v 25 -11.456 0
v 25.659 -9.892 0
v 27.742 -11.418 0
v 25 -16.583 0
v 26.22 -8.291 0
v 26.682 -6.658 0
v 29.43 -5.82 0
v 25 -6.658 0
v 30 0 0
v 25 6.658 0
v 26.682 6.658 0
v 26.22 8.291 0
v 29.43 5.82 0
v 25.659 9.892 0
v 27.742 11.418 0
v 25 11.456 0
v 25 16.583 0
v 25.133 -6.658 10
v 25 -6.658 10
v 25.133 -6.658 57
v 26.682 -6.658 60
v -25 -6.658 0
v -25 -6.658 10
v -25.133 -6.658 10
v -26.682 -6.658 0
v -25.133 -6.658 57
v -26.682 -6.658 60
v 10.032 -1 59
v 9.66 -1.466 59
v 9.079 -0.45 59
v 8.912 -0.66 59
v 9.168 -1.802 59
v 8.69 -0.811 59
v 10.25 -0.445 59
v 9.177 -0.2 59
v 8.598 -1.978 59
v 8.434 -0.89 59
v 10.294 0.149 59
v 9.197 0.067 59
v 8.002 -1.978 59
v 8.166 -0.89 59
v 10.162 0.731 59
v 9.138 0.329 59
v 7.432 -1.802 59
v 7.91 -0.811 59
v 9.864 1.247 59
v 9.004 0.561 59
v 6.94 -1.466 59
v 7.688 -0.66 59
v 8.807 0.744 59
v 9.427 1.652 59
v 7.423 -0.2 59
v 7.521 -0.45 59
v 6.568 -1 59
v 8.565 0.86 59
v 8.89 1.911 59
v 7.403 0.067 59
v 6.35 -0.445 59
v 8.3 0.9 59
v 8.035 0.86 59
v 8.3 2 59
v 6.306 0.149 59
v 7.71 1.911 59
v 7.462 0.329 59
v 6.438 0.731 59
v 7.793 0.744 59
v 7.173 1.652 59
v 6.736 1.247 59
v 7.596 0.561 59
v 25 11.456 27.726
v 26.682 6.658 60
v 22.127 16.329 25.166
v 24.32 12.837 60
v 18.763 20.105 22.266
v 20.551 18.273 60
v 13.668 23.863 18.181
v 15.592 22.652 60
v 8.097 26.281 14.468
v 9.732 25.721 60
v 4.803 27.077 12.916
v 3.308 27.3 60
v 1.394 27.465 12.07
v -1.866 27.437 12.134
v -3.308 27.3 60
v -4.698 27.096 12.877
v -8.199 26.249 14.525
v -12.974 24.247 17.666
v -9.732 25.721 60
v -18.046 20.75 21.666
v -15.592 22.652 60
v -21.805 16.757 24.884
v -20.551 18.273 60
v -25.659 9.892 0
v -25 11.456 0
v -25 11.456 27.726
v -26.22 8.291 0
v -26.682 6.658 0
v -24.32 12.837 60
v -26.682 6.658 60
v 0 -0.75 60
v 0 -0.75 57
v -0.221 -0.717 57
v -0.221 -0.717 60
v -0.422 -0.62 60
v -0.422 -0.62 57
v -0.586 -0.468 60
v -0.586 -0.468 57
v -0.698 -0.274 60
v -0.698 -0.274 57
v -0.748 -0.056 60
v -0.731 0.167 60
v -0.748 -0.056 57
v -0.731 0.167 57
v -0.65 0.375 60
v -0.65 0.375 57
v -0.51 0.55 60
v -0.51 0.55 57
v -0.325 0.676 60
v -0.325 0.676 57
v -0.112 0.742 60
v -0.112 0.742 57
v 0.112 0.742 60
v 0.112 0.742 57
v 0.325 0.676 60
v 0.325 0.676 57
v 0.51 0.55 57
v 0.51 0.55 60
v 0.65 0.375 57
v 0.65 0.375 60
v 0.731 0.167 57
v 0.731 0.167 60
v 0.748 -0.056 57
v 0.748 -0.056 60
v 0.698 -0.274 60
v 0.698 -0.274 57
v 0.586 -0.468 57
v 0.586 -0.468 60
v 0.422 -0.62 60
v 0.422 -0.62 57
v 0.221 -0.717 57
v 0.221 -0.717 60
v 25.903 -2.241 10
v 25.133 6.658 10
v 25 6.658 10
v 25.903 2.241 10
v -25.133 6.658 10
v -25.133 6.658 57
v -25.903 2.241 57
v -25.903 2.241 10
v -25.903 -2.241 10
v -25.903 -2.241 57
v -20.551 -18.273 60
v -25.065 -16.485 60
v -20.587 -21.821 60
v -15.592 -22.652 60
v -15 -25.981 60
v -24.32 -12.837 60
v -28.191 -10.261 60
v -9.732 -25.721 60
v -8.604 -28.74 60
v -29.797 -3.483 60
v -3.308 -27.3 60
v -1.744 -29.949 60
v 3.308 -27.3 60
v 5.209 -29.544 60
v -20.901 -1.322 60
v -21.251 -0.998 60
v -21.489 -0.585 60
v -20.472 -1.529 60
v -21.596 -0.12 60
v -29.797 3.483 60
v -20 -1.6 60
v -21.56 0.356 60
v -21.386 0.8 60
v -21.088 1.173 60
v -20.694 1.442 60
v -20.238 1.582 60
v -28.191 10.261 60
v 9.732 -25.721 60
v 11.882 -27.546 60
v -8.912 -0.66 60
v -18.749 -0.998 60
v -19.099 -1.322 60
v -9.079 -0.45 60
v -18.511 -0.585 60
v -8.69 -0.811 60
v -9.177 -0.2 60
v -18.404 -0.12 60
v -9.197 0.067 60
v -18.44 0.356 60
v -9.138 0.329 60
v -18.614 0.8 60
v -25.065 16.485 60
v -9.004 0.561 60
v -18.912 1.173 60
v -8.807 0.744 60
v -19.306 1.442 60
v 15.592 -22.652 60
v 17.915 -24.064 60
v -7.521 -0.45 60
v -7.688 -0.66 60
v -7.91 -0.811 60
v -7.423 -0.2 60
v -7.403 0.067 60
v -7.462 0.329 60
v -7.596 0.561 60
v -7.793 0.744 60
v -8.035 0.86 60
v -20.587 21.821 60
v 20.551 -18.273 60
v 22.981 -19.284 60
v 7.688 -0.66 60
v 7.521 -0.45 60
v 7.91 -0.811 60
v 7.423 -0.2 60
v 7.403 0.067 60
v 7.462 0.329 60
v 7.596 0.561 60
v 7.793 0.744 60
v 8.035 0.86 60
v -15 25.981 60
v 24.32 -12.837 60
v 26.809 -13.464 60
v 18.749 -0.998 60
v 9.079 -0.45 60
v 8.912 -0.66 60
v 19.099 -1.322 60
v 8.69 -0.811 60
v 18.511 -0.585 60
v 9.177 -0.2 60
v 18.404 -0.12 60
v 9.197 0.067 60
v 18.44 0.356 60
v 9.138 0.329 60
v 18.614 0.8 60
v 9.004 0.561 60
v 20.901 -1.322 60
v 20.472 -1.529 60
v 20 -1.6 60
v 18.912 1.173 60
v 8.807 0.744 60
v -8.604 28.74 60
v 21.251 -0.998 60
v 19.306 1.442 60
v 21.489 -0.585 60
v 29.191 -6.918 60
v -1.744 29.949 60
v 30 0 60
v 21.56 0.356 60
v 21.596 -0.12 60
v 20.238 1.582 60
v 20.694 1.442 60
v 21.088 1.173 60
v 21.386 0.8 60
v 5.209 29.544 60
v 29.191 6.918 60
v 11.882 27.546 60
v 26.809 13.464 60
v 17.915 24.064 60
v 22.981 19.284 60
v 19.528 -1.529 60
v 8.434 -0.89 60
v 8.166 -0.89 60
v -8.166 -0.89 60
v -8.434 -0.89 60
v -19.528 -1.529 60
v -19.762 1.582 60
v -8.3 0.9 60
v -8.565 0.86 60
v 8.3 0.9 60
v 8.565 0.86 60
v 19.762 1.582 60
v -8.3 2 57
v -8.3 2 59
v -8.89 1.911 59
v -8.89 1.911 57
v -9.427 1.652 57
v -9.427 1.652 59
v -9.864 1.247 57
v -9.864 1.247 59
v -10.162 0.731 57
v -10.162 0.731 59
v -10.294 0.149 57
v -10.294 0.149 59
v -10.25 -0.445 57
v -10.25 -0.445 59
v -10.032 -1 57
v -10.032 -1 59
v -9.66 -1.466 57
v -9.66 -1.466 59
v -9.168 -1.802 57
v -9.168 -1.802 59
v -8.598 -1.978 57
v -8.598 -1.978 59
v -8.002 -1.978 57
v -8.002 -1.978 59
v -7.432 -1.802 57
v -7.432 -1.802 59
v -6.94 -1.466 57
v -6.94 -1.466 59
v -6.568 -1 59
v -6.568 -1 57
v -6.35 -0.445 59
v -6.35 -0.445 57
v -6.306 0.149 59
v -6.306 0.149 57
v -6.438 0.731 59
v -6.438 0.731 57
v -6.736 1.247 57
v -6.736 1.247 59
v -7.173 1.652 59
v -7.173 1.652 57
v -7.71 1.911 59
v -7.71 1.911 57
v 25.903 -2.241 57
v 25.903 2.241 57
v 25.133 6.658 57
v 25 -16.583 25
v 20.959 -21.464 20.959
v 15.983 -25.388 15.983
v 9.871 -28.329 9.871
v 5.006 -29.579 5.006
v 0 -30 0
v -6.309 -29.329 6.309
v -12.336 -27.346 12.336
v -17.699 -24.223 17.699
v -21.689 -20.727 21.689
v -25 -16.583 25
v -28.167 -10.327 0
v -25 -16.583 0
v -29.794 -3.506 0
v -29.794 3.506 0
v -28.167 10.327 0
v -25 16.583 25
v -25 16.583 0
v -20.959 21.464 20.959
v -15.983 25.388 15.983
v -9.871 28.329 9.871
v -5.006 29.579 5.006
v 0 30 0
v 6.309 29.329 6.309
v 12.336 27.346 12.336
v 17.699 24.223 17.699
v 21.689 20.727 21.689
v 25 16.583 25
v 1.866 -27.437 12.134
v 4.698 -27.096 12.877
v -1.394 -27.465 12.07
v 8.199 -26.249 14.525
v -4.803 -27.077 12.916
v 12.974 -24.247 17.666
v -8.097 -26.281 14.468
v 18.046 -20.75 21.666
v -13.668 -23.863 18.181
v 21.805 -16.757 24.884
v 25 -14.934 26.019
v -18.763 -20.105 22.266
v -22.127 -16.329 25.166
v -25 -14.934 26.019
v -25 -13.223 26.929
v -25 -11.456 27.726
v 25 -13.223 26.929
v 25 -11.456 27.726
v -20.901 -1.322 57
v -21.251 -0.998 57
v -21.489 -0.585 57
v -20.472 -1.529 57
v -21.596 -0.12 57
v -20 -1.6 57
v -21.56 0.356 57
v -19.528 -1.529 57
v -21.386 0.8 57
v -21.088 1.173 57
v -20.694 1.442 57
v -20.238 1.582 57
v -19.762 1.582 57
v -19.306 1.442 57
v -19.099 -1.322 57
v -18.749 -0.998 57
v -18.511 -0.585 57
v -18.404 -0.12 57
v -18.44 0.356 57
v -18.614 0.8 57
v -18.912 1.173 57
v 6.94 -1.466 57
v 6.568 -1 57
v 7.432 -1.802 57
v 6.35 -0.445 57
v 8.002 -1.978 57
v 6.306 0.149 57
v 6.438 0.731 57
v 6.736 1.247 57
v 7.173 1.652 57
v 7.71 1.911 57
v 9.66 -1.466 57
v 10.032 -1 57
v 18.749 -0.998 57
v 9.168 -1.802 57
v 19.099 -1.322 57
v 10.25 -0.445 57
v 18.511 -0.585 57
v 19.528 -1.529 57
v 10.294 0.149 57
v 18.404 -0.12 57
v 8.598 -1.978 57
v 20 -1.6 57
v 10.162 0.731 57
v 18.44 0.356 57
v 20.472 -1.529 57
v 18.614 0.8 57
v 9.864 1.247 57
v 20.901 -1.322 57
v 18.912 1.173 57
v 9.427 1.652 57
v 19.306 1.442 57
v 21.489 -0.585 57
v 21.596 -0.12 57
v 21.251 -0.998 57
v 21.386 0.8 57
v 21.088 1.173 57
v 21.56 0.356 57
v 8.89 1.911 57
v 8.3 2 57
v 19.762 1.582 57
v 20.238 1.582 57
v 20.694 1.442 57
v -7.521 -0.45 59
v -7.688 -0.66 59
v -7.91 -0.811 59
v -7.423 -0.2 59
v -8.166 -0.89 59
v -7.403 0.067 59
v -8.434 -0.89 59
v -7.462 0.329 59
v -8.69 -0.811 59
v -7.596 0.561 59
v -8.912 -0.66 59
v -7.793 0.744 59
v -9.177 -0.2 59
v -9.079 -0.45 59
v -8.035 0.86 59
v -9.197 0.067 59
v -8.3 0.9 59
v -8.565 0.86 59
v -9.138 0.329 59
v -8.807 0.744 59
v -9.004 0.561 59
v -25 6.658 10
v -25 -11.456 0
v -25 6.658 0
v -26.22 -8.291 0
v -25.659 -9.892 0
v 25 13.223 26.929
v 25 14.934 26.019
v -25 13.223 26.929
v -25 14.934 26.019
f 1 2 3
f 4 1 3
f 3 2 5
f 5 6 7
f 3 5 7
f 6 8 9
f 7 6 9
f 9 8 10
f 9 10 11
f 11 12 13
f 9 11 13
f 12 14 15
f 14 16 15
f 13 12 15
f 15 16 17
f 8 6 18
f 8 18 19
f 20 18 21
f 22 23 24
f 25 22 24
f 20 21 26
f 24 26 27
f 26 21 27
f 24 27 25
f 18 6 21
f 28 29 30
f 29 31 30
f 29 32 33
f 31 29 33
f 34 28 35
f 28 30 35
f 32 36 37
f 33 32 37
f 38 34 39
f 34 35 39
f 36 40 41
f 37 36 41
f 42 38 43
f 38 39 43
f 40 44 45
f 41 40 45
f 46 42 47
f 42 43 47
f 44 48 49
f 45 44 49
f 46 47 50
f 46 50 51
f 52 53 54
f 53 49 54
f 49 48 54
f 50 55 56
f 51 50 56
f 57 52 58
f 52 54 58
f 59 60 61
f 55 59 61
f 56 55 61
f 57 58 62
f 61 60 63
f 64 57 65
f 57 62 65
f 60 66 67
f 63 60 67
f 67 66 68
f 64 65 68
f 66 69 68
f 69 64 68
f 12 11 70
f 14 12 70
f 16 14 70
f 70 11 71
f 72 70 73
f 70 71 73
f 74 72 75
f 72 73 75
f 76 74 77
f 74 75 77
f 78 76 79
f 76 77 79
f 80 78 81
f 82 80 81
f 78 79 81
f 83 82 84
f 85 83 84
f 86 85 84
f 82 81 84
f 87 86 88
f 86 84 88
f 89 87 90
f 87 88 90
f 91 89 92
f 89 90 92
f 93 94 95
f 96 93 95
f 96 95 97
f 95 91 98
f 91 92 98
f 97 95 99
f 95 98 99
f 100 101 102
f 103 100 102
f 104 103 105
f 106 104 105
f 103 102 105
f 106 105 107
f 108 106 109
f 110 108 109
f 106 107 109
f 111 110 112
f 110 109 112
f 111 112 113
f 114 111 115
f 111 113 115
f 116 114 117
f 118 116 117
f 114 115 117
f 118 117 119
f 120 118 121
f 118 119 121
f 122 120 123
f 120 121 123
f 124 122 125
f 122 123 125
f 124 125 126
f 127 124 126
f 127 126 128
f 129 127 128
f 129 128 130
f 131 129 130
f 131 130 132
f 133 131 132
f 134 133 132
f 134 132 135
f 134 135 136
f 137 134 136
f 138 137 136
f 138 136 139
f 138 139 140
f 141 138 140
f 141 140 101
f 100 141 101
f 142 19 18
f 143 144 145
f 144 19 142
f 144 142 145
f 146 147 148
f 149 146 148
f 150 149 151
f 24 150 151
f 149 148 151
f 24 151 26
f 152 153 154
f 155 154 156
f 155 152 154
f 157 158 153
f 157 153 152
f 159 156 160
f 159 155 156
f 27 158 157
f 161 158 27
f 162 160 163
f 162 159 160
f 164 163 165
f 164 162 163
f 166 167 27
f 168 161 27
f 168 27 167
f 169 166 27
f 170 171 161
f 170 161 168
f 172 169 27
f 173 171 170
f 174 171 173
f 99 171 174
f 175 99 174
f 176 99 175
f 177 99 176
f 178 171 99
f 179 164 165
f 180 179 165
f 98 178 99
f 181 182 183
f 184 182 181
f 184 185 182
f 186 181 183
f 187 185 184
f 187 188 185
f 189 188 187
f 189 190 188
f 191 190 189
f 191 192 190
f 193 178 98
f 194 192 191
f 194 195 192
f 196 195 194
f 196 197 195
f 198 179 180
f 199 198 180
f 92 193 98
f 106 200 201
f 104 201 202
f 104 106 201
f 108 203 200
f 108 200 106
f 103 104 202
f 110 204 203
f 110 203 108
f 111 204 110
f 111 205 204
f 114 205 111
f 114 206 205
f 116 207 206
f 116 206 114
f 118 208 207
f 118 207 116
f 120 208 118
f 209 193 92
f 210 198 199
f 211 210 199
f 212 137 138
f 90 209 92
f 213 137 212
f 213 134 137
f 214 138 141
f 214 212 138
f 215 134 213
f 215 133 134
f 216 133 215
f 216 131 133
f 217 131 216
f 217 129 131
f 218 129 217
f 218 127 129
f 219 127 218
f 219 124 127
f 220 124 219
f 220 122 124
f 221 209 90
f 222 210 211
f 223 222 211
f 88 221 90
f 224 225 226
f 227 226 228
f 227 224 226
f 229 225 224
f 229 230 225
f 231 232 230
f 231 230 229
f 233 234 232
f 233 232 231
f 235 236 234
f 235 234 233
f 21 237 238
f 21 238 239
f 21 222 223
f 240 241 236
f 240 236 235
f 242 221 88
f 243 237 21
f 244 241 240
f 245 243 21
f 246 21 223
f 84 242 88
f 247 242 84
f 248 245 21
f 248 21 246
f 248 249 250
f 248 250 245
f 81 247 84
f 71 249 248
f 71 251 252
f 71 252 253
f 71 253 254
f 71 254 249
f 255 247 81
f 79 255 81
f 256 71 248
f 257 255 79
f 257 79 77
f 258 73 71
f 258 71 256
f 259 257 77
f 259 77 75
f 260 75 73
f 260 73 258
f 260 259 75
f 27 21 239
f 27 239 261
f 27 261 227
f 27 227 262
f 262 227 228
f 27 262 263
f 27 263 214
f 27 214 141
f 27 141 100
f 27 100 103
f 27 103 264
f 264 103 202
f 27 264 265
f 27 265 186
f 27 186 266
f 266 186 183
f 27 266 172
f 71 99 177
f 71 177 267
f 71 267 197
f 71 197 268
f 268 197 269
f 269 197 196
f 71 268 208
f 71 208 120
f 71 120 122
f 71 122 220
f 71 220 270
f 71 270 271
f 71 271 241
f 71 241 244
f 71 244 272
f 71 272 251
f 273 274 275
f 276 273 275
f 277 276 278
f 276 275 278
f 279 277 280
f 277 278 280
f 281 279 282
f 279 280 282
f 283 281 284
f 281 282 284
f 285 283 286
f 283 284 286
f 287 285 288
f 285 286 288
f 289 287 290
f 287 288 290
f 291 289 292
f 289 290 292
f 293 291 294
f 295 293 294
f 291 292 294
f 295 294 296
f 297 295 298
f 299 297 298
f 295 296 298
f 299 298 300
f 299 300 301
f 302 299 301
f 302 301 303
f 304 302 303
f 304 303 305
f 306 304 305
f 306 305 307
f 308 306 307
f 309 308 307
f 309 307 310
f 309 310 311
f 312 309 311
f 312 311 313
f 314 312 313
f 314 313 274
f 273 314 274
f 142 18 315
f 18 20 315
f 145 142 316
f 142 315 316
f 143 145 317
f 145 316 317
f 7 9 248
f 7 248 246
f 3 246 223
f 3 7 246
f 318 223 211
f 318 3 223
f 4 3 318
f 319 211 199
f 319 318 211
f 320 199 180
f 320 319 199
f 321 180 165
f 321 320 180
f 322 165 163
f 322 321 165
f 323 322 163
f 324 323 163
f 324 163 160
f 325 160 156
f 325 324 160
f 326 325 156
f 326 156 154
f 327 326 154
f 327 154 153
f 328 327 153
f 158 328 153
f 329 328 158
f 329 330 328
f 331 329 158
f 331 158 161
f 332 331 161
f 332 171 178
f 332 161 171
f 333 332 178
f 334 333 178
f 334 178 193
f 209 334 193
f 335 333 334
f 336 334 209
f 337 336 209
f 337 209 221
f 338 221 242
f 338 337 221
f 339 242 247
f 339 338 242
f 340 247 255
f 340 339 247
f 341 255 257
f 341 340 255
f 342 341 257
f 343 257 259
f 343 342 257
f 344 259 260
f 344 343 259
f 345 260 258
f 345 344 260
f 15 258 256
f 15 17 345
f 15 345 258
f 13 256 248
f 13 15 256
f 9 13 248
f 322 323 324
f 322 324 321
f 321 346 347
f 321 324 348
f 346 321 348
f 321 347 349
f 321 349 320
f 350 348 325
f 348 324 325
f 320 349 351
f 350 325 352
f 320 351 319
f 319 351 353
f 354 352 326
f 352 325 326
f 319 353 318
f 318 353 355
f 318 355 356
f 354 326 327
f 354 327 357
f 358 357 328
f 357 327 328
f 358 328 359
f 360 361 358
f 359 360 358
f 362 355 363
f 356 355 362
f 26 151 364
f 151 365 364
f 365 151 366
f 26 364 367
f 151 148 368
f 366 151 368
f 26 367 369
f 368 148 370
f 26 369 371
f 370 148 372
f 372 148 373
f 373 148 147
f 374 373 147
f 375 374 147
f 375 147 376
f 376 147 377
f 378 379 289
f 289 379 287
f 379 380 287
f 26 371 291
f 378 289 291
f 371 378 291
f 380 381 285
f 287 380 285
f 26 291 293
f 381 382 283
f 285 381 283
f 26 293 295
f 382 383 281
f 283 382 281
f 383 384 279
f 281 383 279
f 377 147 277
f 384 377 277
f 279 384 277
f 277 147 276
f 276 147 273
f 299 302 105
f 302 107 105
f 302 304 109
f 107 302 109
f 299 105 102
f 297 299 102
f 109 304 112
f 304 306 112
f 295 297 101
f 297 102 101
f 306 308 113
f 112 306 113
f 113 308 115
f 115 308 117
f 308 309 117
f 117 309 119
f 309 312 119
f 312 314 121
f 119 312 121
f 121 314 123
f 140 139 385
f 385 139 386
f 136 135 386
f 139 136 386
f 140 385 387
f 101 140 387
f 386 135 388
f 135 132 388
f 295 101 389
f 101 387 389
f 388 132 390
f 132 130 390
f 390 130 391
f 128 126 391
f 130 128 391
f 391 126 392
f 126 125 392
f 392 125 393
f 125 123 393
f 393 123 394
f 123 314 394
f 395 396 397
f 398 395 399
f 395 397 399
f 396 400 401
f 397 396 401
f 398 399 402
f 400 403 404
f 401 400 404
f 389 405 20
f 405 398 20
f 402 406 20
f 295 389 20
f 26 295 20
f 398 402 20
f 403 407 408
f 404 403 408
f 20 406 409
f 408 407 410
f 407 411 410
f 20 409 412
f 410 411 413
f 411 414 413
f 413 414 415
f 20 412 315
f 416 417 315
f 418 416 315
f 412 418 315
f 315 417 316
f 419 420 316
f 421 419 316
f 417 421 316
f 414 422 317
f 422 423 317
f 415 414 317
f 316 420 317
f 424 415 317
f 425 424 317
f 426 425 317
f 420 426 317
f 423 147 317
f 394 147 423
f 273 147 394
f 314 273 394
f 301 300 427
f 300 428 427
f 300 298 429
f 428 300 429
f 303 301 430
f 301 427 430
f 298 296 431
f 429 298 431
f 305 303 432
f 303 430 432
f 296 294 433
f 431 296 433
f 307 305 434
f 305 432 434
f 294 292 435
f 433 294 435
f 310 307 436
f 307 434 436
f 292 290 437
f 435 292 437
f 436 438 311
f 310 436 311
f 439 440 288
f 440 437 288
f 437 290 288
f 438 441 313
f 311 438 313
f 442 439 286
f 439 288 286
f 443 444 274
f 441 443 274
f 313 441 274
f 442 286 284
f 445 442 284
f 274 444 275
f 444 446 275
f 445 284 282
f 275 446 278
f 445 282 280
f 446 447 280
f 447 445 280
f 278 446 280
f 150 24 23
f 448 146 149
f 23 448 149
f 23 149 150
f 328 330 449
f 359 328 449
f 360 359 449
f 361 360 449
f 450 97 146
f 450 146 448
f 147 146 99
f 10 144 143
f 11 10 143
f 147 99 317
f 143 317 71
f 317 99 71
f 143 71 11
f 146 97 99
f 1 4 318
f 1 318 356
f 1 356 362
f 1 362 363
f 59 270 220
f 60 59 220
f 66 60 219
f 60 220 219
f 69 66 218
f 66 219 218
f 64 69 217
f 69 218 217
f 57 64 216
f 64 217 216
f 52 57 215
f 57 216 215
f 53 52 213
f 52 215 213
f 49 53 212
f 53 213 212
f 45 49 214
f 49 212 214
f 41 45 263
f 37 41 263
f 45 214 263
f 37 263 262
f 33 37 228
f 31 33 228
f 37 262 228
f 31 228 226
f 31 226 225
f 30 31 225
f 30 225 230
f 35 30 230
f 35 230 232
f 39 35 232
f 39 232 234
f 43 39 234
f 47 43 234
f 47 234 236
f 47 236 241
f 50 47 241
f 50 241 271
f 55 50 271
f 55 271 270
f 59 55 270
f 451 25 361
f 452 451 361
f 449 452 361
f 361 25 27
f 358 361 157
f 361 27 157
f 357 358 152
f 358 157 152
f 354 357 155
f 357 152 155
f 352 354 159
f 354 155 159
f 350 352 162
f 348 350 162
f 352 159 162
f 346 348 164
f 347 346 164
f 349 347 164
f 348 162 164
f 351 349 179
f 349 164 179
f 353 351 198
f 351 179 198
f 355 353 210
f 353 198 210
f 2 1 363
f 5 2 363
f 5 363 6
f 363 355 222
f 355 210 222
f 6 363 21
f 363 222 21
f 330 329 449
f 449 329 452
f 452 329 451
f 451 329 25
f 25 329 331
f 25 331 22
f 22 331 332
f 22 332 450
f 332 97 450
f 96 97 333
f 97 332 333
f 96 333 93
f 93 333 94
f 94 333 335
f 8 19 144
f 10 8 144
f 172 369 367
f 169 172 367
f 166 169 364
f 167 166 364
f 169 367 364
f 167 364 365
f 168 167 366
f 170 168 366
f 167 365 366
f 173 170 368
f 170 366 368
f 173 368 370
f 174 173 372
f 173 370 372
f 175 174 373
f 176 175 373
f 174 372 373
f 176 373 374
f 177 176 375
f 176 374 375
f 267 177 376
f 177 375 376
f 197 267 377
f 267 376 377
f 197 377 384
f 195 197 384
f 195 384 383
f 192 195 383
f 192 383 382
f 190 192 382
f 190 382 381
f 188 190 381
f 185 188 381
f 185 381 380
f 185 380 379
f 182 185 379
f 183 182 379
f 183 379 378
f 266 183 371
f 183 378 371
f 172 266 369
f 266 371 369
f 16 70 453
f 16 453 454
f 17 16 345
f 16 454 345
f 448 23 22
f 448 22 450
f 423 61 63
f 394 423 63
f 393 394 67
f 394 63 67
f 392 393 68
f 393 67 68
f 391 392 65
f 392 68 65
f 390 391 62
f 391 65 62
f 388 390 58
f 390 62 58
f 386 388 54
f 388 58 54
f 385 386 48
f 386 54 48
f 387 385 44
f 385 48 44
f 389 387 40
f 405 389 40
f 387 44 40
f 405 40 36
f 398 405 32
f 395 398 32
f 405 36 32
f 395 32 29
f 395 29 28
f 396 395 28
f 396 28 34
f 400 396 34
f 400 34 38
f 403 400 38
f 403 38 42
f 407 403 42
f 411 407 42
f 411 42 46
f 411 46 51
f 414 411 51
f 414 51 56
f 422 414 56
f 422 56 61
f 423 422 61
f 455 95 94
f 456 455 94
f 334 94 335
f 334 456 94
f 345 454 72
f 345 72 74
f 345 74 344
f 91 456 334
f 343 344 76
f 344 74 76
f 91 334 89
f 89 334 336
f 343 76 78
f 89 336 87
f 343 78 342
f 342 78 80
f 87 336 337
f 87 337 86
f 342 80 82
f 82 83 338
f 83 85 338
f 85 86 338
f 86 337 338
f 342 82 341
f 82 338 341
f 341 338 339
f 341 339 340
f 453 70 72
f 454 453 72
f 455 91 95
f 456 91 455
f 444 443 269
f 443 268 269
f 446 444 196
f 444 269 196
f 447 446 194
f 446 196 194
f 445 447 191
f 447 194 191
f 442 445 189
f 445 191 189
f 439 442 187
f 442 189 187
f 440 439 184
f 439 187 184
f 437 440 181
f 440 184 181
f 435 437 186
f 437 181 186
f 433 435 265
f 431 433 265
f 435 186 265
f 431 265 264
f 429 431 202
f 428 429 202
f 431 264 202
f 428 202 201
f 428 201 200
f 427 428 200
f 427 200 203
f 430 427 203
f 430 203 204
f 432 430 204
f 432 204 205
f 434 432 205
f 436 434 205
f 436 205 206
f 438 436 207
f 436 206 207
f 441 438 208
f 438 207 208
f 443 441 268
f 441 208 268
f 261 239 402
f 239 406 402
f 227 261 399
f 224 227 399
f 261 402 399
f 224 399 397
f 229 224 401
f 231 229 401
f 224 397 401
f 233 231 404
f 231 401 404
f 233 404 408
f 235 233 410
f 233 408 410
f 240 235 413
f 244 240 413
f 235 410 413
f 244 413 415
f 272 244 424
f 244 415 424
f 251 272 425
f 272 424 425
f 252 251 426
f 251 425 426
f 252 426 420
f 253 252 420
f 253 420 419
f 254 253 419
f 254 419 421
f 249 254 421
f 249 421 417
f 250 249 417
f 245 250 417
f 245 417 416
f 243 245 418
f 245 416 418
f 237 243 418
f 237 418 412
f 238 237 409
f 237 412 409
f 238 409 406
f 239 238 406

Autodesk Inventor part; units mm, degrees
ref_plane "YZ Plane" through (0, 0, 0) normal (1, 0, 0) x (0, 1, 0)
ref_plane "XZ Plane" through (0, 0, 0) normal (0, 1, 0) x (-1, 0, 0)
ref_plane "XY Plane" through (0, 0, 0) normal (0, 0, 1) x (1, 0, 0)
sketch "スケッチ1" plane through (0, 0, 0) normal (0, 0, 1) x (1, 0, 0)
  circle A0 centre (0, 0) radius 30
  dimension "d0" = 60
extrude "押し出し1" add sketch "スケッチ1" along normal blind 60
sketch "スケッチ2" plane through (0, 0, 60) normal (0, 0, 1) x (1, 0, 0)
  circle A0 centre (0, 0) radius 26
  dimension "d3" = 52
extrude "押し出し2" cut sketch "スケッチ2" against normal blind 50
sketch "スケッチ3" plane through (0, 0, 0) normal (0, 0, 1) x (1, 0, 0)
  point P0 (0, 0)
sketch "スケッチ4" plane through (0, 0, 0) normal (1, 0, 0) x (0, 1, 0)
  line L0 (30, 0) -> (-30, 0) projected
  line L1 (-30, 0) -> (-30, 60) projected
  arc A0 (30, 0) -> (-30, 0) centre (0, 0) ccw
  dimension "d6" = 30
extrude "押し出し3" cut sketch "スケッチ4" along normal mid plane 50
sketch "スケッチ5" plane through (0, 0, 60) normal (0, 0, 1) x (1, 0, 0)
  circle A0 centre (0, 0) radius 27.5
extrude "押し出し4" add sketch "スケッチ5" against normal blind 3
sketch "スケッチ19" plane through (0, 0, 60) normal (0, 0, 1) x (1, 0, 0)
  circle A0 centre (0, 0) radius 27.5
  line L0 (27.5, -6.6575) -> (-27.5, -6.6575)
  line L1 (-27.5, -6.6575) -> (-27.5, 6.6575)
  line L2 (-27.5, 6.6575) -> (27.5, 6.6575)
  line L3 (27.5, 6.6575) -> (27.5, -6.6575)
  line L4 (27.5, -6.6575) -> (-27.5, 6.6575) construction
  line L5 (-27.5, -6.6575) -> (27.5, 6.6575) construction
  point P0 (26.682, -6.6575)
  point P1 (-26.682, -6.6575)
  point P2 (-26.682, 6.6575)
  point P3 (26.682, 6.6575)
extrude "押し出し11" cut sketch "スケッチ19" against normal blind 60 contours L2 A0 | A0 L0
sketch "スケッチ22" plane through (0, 0, 60) normal (0, 0, 1) x (1, 0, 0)
  point P0 (0, 0)
sketch "スケッチ23" plane through (0, 0, 60) normal (0, 0, 1) x (1, 0, 0)
  point P0 (0, 0)
  point P1 (-20, 0)
  point P2 (20, 0)
  dimension "d67" = 20
  dimension "d68" = 20
hole "穴4" at (-20, 0, 60) at (20, 0, 60) direction (0, 0, -1) diameter 3.2 depth 8.8 tip angle 118
sketch "スケッチ25" plane through (0, 0, 60) normal (0, 0, 1) x (1, 0, 0)
  point P0 (0, 0)
  point P1 (0, 0)
hole "穴5" at (0, 0, 60) direction (0, 0, -1) diameter 1.5 depth 8.8 tip angle 118
sketch "スケッチ27" plane through (0, 0, 57) normal (0, 0, -1) x (-1, 0, 0)
  point P0 (0, 0)
  point P1 (8.3, 0)
  point P2 (-8.3, 0)
  dimension "d95" = 8.3
  dimension "d96" = 8.3
hole "穴7" at (-8.3, 0, 57) at (8.3, 0, 57) direction (0, 0, 1) diameter 1.8 depth 8.8 tip angle 118 counterbore diameter 4 counterbore depth 2
properties part number "20220527_仮筒"
